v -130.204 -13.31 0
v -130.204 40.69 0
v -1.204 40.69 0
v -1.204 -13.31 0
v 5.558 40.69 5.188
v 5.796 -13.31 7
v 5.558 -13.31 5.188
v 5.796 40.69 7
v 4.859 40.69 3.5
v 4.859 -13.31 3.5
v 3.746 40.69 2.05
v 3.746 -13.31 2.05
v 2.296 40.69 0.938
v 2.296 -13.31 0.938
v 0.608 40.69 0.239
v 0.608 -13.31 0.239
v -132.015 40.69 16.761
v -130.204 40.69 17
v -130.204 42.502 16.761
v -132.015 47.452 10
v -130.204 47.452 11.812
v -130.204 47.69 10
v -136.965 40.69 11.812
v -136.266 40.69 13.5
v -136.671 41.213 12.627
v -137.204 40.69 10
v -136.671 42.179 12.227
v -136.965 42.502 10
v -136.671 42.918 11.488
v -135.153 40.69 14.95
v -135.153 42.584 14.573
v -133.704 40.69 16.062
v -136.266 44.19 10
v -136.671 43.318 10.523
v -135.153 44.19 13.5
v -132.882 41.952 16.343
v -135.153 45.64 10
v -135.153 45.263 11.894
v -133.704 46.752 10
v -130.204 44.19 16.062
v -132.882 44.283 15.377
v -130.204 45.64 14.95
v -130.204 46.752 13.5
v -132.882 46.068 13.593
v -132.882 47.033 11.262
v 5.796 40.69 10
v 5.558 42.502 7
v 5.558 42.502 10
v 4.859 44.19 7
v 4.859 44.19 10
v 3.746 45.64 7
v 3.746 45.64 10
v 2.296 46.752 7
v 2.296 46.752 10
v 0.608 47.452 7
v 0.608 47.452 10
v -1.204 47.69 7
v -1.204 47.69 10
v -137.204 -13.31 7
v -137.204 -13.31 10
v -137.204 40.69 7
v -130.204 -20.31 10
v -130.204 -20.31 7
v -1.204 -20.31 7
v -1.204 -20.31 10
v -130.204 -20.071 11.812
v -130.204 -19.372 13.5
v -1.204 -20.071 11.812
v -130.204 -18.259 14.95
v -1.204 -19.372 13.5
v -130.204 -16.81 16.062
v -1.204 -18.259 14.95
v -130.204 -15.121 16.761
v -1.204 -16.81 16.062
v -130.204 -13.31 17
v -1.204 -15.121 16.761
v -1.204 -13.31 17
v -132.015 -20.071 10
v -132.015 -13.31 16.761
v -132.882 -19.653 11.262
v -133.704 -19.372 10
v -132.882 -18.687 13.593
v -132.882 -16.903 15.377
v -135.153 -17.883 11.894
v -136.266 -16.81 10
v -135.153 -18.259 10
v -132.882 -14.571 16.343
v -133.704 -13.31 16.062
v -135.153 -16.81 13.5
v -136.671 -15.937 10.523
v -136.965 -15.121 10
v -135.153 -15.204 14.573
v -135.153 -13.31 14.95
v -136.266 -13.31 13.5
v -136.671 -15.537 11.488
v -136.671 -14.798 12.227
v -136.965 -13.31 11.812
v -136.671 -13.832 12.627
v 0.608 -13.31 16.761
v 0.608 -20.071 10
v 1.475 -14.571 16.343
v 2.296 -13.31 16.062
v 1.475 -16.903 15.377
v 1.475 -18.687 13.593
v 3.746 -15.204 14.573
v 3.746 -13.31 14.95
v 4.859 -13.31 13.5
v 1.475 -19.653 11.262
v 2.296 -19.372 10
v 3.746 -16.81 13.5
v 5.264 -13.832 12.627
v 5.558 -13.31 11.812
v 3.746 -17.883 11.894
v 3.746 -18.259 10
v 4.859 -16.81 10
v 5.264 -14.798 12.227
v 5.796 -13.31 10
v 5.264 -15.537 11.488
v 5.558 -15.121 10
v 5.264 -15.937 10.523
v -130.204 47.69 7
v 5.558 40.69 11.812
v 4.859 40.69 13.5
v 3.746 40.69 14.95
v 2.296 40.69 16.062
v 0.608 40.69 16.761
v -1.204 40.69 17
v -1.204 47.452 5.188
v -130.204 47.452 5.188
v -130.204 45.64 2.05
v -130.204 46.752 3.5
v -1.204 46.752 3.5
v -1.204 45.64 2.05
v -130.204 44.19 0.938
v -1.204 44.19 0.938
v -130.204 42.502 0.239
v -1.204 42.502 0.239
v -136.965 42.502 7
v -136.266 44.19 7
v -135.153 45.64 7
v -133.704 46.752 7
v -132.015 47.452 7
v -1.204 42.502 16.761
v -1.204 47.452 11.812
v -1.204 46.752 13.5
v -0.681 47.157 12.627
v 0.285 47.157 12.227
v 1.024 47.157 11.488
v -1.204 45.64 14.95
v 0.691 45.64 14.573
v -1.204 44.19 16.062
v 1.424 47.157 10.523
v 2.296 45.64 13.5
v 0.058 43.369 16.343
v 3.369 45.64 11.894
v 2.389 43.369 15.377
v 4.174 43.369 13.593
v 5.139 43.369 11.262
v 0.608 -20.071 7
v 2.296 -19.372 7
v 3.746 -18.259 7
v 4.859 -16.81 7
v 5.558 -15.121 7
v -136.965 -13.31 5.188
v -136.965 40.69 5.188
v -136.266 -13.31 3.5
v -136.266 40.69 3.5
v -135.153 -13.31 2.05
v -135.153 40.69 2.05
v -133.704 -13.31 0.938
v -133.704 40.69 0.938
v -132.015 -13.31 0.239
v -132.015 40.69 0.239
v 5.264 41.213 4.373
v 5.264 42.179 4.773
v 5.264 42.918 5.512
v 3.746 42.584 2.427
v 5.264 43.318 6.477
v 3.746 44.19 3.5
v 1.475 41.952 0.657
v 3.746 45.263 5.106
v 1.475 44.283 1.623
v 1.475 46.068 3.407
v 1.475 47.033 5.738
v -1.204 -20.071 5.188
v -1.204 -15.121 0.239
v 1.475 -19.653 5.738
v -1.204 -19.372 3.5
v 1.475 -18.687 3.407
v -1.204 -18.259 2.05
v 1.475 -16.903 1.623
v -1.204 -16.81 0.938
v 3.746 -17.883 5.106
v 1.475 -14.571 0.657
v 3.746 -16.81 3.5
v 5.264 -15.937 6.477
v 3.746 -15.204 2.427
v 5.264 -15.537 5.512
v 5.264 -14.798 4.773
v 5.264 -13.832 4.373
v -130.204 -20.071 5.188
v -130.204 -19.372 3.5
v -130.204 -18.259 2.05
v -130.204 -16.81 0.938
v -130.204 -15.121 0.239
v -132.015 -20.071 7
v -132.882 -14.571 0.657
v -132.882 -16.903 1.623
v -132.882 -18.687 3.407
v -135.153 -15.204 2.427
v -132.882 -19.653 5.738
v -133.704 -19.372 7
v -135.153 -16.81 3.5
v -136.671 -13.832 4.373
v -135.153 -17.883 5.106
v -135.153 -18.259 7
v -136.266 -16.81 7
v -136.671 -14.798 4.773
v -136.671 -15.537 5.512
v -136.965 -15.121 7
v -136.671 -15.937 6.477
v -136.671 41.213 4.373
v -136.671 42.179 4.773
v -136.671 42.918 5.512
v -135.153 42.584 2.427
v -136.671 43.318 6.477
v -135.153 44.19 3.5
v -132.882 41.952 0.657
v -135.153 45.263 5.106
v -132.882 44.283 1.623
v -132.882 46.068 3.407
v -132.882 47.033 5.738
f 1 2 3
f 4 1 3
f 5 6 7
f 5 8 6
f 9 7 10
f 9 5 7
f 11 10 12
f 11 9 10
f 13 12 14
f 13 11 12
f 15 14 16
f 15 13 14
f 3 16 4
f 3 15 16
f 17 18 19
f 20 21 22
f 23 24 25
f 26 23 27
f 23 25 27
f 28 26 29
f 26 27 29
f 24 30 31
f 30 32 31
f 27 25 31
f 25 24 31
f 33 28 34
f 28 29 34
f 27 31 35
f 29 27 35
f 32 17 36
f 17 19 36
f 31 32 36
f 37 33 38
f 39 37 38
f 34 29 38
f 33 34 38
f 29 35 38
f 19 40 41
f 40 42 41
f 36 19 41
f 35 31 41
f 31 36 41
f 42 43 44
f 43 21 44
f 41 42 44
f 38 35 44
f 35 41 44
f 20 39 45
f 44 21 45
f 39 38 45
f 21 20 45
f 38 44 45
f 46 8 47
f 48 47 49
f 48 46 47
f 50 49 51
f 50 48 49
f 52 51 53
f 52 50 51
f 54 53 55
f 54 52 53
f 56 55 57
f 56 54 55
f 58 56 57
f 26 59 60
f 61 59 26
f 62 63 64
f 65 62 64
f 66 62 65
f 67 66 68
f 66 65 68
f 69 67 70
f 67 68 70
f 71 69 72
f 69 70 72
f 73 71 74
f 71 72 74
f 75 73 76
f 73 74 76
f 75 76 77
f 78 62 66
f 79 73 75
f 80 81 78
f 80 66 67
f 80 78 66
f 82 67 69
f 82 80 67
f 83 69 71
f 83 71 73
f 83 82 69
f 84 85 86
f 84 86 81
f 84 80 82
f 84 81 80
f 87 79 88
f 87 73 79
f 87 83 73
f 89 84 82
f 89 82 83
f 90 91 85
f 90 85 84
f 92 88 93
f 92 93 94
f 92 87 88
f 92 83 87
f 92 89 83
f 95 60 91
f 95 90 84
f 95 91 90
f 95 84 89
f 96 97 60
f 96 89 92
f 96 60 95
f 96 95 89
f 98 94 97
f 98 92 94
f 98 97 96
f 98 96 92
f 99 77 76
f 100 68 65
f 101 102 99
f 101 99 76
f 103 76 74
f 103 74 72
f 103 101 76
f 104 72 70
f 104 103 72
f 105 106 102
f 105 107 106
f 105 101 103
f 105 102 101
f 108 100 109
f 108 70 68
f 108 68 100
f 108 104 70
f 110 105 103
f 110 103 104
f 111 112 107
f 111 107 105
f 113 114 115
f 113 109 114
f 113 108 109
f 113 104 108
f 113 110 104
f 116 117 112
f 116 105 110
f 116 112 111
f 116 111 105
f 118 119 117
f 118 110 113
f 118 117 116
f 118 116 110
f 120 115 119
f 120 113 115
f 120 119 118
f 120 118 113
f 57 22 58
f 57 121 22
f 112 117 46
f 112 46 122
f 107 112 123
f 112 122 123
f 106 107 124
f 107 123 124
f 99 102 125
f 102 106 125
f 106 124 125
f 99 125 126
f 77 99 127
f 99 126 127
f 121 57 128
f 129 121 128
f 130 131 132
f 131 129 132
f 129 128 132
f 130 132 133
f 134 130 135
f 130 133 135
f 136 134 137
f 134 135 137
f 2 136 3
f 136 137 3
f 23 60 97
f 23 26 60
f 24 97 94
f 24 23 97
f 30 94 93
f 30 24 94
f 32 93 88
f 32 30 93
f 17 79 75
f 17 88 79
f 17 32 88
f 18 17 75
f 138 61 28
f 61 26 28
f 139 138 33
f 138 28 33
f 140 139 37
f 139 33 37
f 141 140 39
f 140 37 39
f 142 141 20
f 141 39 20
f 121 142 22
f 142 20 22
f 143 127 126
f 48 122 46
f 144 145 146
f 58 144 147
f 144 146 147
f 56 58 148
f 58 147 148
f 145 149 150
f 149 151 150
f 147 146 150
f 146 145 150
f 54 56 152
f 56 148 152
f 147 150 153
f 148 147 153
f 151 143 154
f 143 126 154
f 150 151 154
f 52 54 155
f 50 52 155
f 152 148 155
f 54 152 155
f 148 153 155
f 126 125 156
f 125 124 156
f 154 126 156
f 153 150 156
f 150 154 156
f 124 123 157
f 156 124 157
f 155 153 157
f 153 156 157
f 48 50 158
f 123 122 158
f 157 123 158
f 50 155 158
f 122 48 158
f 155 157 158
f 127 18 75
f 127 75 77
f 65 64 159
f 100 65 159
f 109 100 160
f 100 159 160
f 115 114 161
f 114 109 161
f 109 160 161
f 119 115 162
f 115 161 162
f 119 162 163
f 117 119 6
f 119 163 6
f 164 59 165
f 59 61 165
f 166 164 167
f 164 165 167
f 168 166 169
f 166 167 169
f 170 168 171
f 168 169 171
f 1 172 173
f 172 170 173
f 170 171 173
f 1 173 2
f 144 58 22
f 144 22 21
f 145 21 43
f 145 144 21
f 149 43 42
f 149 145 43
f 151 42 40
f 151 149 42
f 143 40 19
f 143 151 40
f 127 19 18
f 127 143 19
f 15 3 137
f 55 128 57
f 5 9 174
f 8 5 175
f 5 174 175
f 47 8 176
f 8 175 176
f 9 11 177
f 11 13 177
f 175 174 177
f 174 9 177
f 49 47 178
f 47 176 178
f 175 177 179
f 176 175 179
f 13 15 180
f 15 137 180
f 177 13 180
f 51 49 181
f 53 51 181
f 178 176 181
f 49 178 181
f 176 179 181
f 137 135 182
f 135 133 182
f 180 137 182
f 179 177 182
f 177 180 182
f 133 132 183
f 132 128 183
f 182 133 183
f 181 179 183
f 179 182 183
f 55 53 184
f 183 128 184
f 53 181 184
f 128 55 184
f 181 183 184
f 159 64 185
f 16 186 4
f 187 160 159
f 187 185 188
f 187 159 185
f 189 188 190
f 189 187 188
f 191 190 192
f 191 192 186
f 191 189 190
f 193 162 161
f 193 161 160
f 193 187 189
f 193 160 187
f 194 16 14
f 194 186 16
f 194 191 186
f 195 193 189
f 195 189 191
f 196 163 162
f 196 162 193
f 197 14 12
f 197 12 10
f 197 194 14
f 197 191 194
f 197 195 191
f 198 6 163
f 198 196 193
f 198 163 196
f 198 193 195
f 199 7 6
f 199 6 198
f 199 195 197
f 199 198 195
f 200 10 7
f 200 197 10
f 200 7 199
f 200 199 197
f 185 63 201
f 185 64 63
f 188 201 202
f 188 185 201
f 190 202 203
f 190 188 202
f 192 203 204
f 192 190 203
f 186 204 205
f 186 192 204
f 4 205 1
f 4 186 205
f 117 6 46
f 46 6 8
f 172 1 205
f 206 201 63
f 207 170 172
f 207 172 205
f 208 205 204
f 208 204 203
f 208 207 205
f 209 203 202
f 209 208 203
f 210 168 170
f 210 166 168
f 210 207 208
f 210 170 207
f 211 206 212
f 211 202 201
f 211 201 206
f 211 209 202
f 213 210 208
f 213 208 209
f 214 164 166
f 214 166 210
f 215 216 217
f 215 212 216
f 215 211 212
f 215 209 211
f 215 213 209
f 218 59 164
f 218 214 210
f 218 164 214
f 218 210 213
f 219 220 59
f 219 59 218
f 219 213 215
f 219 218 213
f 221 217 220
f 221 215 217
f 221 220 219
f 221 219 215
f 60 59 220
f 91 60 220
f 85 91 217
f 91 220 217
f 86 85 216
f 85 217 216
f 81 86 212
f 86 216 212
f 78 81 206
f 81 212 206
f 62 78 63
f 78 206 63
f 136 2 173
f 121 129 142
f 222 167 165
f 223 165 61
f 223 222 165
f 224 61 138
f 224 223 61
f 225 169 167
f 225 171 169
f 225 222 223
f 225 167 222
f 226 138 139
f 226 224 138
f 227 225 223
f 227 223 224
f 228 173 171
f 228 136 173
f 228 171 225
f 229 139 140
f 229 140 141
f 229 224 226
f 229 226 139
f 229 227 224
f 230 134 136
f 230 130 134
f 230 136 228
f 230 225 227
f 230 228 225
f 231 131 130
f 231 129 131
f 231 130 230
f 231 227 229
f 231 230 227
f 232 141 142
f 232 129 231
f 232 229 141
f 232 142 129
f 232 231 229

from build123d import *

# Parameters (mm, degrees)
SKETCH1_W           = 143
SKETCH1_H           = 68
BOSS_EXTRUDE1_DEPTH = 17
FILLET1_R           = 7
FILLET2_R           = 7


with BuildPart() as part:
    # Sketch1 → Boss-Extrude1 (new body)
    with BuildSketch(Plane.XY):
        with Locations((-65.703539823, 13.690265487)):
            Rectangle(SKETCH1_W, SKETCH1_H)
    extrude(amount=BOSS_EXTRUDE1_DEPTH)

    # Fillet1
    fillet1_edges = [part.edges().sort_by_distance(p)[0] for p in [
        (5.796460177, 13.690265487, 17),
        (-65.703539823, 47.690265487, 17),
        (-137.203539823, 13.690265487, 17),
        (-65.703539823, 47.690265487, 0),
        (5.796460177, 13.690265487, 0),
        (-65.703539823, -20.309734513, 0),
        (-137.203539823, 13.690265487, 0),
        (-137.203539823, 47.690265487, 8.5),
        (5.796460177, 47.690265487, 8.5),
        (-65.703539823, -20.309734513, 17),
    ]]
    fillet(fillet1_edges, radius=FILLET1_R)

    # Fillet2
    # the kernel refuses this fillet: 7 mm, written as the material it takes off along each edge
    with BuildSketch(Plane(origin=(-130.203539823, -13.309734513, 10), x_dir=(0, -1, 0), z_dir=(-1, 0, 0))) as fillet2_piece_1_section:
        Polygon((0, 0), (FILLET2_R, 0), (FILLET2_R, FILLET2_R), (0, FILLET2_R), align=None)
    fillet2_piece_1 = extrude(amount=FILLET2_R, mode=Mode.PRIVATE)
    fillet2_piece_1 = fillet2_piece_1 - Plane(origin=(-130.203539823, -13.309734513, 10), x_dir=(0, 0.7071067811865475, -0.7071067811865475), z_dir=(-1, 0, 0)) * Sphere(FILLET2_R, mode=Mode.PRIVATE)
    add(fillet2_piece_1, mode=Mode.SUBTRACT)
    with BuildSketch(Plane(origin=(-130.203539823, -13.309734513, 7), x_dir=(0, -1, 0), z_dir=(-1, 0, 0))) as fillet2_piece_2_section:
        Polygon((0, 0), (FILLET2_R, 0), (FILLET2_R, -FILLET2_R), (0, -FILLET2_R), align=None)
    fillet2_piece_2 = extrude(amount=FILLET2_R, mode=Mode.PRIVATE)
    fillet2_piece_2 = fillet2_piece_2 - Plane(origin=(-130.203539823, -13.309734513, 7), x_dir=(0, 0.7071067811865475, 0.7071067811865475), z_dir=(-1, 0, 0)) * Sphere(FILLET2_R, mode=Mode.PRIVATE)
    add(fillet2_piece_2, mode=Mode.SUBTRACT)
    with BuildSketch(Plane(origin=(-1.203539823, -13.309734513, 10), x_dir=(0, -1, 0), z_dir=(1, 0, 0))) as fillet2_piece_3_section:
        Polygon((0, 0), (FILLET2_R, 0), (FILLET2_R, -FILLET2_R), (0, -FILLET2_R), align=None)
    fillet2_piece_3 = extrude(amount=FILLET2_R, mode=Mode.PRIVATE)
    fillet2_piece_3 = fillet2_piece_3 - Plane(origin=(-1.203539823, -13.309734513, 10), x_dir=(0, 0.7071067811865475, -0.7071067811865475), z_dir=(1, 0, 0)) * Sphere(FILLET2_R, mode=Mode.PRIVATE)
    add(fillet2_piece_3, mode=Mode.SUBTRACT)
    with BuildSketch(Plane(origin=(-1.203539823, -13.309734513, 7), x_dir=(0, -1, 0), z_dir=(1, 0, 0))) as fillet2_piece_4_section:
        Polygon((0, 0), (FILLET2_R, 0), (FILLET2_R, FILLET2_R), (0, FILLET2_R), align=None)
    fillet2_piece_4 = extrude(amount=FILLET2_R, mode=Mode.PRIVATE)
    fillet2_piece_4 = fillet2_piece_4 - Plane(origin=(-1.203539823, -13.309734513, 7), x_dir=(0, 0.7071067811865475, 0.7071067811865475), z_dir=(1, 0, 0)) * Sphere(FILLET2_R, mode=Mode.PRIVATE)
    add(fillet2_piece_4, mode=Mode.SUBTRACT)
    with BuildSketch(Plane(origin=(5.796460177, -20.309734513, 7), x_dir=(0, 1, 0), z_dir=(0, 0, 1))) as fillet2_piece_5:
        with BuildLine():
            CenterArc((FILLET2_R, FILLET2_R), FILLET2_R, 180, 90)
            Line((0, FILLET2_R), (0, 0))
            Line((0, 0), (FILLET2_R, 0))
        make_face()
    extrude(amount=3, mode=Mode.SUBTRACT)
    with BuildSketch(Plane(origin=(-137.203539823, -20.309734513, 7), x_dir=(0, 1, 0), z_dir=(0, 0, 1))) as fillet2_piece_6:
        with BuildLine():
            CenterArc((FILLET2_R, -FILLET2_R), FILLET2_R, 90, 90)
            Line((0, -FILLET2_R), (0, 0))
            Line((0, 0), (FILLET2_R, 0))
        make_face()
    extrude(amount=3, mode=Mode.SUBTRACT)


solid = part.part
